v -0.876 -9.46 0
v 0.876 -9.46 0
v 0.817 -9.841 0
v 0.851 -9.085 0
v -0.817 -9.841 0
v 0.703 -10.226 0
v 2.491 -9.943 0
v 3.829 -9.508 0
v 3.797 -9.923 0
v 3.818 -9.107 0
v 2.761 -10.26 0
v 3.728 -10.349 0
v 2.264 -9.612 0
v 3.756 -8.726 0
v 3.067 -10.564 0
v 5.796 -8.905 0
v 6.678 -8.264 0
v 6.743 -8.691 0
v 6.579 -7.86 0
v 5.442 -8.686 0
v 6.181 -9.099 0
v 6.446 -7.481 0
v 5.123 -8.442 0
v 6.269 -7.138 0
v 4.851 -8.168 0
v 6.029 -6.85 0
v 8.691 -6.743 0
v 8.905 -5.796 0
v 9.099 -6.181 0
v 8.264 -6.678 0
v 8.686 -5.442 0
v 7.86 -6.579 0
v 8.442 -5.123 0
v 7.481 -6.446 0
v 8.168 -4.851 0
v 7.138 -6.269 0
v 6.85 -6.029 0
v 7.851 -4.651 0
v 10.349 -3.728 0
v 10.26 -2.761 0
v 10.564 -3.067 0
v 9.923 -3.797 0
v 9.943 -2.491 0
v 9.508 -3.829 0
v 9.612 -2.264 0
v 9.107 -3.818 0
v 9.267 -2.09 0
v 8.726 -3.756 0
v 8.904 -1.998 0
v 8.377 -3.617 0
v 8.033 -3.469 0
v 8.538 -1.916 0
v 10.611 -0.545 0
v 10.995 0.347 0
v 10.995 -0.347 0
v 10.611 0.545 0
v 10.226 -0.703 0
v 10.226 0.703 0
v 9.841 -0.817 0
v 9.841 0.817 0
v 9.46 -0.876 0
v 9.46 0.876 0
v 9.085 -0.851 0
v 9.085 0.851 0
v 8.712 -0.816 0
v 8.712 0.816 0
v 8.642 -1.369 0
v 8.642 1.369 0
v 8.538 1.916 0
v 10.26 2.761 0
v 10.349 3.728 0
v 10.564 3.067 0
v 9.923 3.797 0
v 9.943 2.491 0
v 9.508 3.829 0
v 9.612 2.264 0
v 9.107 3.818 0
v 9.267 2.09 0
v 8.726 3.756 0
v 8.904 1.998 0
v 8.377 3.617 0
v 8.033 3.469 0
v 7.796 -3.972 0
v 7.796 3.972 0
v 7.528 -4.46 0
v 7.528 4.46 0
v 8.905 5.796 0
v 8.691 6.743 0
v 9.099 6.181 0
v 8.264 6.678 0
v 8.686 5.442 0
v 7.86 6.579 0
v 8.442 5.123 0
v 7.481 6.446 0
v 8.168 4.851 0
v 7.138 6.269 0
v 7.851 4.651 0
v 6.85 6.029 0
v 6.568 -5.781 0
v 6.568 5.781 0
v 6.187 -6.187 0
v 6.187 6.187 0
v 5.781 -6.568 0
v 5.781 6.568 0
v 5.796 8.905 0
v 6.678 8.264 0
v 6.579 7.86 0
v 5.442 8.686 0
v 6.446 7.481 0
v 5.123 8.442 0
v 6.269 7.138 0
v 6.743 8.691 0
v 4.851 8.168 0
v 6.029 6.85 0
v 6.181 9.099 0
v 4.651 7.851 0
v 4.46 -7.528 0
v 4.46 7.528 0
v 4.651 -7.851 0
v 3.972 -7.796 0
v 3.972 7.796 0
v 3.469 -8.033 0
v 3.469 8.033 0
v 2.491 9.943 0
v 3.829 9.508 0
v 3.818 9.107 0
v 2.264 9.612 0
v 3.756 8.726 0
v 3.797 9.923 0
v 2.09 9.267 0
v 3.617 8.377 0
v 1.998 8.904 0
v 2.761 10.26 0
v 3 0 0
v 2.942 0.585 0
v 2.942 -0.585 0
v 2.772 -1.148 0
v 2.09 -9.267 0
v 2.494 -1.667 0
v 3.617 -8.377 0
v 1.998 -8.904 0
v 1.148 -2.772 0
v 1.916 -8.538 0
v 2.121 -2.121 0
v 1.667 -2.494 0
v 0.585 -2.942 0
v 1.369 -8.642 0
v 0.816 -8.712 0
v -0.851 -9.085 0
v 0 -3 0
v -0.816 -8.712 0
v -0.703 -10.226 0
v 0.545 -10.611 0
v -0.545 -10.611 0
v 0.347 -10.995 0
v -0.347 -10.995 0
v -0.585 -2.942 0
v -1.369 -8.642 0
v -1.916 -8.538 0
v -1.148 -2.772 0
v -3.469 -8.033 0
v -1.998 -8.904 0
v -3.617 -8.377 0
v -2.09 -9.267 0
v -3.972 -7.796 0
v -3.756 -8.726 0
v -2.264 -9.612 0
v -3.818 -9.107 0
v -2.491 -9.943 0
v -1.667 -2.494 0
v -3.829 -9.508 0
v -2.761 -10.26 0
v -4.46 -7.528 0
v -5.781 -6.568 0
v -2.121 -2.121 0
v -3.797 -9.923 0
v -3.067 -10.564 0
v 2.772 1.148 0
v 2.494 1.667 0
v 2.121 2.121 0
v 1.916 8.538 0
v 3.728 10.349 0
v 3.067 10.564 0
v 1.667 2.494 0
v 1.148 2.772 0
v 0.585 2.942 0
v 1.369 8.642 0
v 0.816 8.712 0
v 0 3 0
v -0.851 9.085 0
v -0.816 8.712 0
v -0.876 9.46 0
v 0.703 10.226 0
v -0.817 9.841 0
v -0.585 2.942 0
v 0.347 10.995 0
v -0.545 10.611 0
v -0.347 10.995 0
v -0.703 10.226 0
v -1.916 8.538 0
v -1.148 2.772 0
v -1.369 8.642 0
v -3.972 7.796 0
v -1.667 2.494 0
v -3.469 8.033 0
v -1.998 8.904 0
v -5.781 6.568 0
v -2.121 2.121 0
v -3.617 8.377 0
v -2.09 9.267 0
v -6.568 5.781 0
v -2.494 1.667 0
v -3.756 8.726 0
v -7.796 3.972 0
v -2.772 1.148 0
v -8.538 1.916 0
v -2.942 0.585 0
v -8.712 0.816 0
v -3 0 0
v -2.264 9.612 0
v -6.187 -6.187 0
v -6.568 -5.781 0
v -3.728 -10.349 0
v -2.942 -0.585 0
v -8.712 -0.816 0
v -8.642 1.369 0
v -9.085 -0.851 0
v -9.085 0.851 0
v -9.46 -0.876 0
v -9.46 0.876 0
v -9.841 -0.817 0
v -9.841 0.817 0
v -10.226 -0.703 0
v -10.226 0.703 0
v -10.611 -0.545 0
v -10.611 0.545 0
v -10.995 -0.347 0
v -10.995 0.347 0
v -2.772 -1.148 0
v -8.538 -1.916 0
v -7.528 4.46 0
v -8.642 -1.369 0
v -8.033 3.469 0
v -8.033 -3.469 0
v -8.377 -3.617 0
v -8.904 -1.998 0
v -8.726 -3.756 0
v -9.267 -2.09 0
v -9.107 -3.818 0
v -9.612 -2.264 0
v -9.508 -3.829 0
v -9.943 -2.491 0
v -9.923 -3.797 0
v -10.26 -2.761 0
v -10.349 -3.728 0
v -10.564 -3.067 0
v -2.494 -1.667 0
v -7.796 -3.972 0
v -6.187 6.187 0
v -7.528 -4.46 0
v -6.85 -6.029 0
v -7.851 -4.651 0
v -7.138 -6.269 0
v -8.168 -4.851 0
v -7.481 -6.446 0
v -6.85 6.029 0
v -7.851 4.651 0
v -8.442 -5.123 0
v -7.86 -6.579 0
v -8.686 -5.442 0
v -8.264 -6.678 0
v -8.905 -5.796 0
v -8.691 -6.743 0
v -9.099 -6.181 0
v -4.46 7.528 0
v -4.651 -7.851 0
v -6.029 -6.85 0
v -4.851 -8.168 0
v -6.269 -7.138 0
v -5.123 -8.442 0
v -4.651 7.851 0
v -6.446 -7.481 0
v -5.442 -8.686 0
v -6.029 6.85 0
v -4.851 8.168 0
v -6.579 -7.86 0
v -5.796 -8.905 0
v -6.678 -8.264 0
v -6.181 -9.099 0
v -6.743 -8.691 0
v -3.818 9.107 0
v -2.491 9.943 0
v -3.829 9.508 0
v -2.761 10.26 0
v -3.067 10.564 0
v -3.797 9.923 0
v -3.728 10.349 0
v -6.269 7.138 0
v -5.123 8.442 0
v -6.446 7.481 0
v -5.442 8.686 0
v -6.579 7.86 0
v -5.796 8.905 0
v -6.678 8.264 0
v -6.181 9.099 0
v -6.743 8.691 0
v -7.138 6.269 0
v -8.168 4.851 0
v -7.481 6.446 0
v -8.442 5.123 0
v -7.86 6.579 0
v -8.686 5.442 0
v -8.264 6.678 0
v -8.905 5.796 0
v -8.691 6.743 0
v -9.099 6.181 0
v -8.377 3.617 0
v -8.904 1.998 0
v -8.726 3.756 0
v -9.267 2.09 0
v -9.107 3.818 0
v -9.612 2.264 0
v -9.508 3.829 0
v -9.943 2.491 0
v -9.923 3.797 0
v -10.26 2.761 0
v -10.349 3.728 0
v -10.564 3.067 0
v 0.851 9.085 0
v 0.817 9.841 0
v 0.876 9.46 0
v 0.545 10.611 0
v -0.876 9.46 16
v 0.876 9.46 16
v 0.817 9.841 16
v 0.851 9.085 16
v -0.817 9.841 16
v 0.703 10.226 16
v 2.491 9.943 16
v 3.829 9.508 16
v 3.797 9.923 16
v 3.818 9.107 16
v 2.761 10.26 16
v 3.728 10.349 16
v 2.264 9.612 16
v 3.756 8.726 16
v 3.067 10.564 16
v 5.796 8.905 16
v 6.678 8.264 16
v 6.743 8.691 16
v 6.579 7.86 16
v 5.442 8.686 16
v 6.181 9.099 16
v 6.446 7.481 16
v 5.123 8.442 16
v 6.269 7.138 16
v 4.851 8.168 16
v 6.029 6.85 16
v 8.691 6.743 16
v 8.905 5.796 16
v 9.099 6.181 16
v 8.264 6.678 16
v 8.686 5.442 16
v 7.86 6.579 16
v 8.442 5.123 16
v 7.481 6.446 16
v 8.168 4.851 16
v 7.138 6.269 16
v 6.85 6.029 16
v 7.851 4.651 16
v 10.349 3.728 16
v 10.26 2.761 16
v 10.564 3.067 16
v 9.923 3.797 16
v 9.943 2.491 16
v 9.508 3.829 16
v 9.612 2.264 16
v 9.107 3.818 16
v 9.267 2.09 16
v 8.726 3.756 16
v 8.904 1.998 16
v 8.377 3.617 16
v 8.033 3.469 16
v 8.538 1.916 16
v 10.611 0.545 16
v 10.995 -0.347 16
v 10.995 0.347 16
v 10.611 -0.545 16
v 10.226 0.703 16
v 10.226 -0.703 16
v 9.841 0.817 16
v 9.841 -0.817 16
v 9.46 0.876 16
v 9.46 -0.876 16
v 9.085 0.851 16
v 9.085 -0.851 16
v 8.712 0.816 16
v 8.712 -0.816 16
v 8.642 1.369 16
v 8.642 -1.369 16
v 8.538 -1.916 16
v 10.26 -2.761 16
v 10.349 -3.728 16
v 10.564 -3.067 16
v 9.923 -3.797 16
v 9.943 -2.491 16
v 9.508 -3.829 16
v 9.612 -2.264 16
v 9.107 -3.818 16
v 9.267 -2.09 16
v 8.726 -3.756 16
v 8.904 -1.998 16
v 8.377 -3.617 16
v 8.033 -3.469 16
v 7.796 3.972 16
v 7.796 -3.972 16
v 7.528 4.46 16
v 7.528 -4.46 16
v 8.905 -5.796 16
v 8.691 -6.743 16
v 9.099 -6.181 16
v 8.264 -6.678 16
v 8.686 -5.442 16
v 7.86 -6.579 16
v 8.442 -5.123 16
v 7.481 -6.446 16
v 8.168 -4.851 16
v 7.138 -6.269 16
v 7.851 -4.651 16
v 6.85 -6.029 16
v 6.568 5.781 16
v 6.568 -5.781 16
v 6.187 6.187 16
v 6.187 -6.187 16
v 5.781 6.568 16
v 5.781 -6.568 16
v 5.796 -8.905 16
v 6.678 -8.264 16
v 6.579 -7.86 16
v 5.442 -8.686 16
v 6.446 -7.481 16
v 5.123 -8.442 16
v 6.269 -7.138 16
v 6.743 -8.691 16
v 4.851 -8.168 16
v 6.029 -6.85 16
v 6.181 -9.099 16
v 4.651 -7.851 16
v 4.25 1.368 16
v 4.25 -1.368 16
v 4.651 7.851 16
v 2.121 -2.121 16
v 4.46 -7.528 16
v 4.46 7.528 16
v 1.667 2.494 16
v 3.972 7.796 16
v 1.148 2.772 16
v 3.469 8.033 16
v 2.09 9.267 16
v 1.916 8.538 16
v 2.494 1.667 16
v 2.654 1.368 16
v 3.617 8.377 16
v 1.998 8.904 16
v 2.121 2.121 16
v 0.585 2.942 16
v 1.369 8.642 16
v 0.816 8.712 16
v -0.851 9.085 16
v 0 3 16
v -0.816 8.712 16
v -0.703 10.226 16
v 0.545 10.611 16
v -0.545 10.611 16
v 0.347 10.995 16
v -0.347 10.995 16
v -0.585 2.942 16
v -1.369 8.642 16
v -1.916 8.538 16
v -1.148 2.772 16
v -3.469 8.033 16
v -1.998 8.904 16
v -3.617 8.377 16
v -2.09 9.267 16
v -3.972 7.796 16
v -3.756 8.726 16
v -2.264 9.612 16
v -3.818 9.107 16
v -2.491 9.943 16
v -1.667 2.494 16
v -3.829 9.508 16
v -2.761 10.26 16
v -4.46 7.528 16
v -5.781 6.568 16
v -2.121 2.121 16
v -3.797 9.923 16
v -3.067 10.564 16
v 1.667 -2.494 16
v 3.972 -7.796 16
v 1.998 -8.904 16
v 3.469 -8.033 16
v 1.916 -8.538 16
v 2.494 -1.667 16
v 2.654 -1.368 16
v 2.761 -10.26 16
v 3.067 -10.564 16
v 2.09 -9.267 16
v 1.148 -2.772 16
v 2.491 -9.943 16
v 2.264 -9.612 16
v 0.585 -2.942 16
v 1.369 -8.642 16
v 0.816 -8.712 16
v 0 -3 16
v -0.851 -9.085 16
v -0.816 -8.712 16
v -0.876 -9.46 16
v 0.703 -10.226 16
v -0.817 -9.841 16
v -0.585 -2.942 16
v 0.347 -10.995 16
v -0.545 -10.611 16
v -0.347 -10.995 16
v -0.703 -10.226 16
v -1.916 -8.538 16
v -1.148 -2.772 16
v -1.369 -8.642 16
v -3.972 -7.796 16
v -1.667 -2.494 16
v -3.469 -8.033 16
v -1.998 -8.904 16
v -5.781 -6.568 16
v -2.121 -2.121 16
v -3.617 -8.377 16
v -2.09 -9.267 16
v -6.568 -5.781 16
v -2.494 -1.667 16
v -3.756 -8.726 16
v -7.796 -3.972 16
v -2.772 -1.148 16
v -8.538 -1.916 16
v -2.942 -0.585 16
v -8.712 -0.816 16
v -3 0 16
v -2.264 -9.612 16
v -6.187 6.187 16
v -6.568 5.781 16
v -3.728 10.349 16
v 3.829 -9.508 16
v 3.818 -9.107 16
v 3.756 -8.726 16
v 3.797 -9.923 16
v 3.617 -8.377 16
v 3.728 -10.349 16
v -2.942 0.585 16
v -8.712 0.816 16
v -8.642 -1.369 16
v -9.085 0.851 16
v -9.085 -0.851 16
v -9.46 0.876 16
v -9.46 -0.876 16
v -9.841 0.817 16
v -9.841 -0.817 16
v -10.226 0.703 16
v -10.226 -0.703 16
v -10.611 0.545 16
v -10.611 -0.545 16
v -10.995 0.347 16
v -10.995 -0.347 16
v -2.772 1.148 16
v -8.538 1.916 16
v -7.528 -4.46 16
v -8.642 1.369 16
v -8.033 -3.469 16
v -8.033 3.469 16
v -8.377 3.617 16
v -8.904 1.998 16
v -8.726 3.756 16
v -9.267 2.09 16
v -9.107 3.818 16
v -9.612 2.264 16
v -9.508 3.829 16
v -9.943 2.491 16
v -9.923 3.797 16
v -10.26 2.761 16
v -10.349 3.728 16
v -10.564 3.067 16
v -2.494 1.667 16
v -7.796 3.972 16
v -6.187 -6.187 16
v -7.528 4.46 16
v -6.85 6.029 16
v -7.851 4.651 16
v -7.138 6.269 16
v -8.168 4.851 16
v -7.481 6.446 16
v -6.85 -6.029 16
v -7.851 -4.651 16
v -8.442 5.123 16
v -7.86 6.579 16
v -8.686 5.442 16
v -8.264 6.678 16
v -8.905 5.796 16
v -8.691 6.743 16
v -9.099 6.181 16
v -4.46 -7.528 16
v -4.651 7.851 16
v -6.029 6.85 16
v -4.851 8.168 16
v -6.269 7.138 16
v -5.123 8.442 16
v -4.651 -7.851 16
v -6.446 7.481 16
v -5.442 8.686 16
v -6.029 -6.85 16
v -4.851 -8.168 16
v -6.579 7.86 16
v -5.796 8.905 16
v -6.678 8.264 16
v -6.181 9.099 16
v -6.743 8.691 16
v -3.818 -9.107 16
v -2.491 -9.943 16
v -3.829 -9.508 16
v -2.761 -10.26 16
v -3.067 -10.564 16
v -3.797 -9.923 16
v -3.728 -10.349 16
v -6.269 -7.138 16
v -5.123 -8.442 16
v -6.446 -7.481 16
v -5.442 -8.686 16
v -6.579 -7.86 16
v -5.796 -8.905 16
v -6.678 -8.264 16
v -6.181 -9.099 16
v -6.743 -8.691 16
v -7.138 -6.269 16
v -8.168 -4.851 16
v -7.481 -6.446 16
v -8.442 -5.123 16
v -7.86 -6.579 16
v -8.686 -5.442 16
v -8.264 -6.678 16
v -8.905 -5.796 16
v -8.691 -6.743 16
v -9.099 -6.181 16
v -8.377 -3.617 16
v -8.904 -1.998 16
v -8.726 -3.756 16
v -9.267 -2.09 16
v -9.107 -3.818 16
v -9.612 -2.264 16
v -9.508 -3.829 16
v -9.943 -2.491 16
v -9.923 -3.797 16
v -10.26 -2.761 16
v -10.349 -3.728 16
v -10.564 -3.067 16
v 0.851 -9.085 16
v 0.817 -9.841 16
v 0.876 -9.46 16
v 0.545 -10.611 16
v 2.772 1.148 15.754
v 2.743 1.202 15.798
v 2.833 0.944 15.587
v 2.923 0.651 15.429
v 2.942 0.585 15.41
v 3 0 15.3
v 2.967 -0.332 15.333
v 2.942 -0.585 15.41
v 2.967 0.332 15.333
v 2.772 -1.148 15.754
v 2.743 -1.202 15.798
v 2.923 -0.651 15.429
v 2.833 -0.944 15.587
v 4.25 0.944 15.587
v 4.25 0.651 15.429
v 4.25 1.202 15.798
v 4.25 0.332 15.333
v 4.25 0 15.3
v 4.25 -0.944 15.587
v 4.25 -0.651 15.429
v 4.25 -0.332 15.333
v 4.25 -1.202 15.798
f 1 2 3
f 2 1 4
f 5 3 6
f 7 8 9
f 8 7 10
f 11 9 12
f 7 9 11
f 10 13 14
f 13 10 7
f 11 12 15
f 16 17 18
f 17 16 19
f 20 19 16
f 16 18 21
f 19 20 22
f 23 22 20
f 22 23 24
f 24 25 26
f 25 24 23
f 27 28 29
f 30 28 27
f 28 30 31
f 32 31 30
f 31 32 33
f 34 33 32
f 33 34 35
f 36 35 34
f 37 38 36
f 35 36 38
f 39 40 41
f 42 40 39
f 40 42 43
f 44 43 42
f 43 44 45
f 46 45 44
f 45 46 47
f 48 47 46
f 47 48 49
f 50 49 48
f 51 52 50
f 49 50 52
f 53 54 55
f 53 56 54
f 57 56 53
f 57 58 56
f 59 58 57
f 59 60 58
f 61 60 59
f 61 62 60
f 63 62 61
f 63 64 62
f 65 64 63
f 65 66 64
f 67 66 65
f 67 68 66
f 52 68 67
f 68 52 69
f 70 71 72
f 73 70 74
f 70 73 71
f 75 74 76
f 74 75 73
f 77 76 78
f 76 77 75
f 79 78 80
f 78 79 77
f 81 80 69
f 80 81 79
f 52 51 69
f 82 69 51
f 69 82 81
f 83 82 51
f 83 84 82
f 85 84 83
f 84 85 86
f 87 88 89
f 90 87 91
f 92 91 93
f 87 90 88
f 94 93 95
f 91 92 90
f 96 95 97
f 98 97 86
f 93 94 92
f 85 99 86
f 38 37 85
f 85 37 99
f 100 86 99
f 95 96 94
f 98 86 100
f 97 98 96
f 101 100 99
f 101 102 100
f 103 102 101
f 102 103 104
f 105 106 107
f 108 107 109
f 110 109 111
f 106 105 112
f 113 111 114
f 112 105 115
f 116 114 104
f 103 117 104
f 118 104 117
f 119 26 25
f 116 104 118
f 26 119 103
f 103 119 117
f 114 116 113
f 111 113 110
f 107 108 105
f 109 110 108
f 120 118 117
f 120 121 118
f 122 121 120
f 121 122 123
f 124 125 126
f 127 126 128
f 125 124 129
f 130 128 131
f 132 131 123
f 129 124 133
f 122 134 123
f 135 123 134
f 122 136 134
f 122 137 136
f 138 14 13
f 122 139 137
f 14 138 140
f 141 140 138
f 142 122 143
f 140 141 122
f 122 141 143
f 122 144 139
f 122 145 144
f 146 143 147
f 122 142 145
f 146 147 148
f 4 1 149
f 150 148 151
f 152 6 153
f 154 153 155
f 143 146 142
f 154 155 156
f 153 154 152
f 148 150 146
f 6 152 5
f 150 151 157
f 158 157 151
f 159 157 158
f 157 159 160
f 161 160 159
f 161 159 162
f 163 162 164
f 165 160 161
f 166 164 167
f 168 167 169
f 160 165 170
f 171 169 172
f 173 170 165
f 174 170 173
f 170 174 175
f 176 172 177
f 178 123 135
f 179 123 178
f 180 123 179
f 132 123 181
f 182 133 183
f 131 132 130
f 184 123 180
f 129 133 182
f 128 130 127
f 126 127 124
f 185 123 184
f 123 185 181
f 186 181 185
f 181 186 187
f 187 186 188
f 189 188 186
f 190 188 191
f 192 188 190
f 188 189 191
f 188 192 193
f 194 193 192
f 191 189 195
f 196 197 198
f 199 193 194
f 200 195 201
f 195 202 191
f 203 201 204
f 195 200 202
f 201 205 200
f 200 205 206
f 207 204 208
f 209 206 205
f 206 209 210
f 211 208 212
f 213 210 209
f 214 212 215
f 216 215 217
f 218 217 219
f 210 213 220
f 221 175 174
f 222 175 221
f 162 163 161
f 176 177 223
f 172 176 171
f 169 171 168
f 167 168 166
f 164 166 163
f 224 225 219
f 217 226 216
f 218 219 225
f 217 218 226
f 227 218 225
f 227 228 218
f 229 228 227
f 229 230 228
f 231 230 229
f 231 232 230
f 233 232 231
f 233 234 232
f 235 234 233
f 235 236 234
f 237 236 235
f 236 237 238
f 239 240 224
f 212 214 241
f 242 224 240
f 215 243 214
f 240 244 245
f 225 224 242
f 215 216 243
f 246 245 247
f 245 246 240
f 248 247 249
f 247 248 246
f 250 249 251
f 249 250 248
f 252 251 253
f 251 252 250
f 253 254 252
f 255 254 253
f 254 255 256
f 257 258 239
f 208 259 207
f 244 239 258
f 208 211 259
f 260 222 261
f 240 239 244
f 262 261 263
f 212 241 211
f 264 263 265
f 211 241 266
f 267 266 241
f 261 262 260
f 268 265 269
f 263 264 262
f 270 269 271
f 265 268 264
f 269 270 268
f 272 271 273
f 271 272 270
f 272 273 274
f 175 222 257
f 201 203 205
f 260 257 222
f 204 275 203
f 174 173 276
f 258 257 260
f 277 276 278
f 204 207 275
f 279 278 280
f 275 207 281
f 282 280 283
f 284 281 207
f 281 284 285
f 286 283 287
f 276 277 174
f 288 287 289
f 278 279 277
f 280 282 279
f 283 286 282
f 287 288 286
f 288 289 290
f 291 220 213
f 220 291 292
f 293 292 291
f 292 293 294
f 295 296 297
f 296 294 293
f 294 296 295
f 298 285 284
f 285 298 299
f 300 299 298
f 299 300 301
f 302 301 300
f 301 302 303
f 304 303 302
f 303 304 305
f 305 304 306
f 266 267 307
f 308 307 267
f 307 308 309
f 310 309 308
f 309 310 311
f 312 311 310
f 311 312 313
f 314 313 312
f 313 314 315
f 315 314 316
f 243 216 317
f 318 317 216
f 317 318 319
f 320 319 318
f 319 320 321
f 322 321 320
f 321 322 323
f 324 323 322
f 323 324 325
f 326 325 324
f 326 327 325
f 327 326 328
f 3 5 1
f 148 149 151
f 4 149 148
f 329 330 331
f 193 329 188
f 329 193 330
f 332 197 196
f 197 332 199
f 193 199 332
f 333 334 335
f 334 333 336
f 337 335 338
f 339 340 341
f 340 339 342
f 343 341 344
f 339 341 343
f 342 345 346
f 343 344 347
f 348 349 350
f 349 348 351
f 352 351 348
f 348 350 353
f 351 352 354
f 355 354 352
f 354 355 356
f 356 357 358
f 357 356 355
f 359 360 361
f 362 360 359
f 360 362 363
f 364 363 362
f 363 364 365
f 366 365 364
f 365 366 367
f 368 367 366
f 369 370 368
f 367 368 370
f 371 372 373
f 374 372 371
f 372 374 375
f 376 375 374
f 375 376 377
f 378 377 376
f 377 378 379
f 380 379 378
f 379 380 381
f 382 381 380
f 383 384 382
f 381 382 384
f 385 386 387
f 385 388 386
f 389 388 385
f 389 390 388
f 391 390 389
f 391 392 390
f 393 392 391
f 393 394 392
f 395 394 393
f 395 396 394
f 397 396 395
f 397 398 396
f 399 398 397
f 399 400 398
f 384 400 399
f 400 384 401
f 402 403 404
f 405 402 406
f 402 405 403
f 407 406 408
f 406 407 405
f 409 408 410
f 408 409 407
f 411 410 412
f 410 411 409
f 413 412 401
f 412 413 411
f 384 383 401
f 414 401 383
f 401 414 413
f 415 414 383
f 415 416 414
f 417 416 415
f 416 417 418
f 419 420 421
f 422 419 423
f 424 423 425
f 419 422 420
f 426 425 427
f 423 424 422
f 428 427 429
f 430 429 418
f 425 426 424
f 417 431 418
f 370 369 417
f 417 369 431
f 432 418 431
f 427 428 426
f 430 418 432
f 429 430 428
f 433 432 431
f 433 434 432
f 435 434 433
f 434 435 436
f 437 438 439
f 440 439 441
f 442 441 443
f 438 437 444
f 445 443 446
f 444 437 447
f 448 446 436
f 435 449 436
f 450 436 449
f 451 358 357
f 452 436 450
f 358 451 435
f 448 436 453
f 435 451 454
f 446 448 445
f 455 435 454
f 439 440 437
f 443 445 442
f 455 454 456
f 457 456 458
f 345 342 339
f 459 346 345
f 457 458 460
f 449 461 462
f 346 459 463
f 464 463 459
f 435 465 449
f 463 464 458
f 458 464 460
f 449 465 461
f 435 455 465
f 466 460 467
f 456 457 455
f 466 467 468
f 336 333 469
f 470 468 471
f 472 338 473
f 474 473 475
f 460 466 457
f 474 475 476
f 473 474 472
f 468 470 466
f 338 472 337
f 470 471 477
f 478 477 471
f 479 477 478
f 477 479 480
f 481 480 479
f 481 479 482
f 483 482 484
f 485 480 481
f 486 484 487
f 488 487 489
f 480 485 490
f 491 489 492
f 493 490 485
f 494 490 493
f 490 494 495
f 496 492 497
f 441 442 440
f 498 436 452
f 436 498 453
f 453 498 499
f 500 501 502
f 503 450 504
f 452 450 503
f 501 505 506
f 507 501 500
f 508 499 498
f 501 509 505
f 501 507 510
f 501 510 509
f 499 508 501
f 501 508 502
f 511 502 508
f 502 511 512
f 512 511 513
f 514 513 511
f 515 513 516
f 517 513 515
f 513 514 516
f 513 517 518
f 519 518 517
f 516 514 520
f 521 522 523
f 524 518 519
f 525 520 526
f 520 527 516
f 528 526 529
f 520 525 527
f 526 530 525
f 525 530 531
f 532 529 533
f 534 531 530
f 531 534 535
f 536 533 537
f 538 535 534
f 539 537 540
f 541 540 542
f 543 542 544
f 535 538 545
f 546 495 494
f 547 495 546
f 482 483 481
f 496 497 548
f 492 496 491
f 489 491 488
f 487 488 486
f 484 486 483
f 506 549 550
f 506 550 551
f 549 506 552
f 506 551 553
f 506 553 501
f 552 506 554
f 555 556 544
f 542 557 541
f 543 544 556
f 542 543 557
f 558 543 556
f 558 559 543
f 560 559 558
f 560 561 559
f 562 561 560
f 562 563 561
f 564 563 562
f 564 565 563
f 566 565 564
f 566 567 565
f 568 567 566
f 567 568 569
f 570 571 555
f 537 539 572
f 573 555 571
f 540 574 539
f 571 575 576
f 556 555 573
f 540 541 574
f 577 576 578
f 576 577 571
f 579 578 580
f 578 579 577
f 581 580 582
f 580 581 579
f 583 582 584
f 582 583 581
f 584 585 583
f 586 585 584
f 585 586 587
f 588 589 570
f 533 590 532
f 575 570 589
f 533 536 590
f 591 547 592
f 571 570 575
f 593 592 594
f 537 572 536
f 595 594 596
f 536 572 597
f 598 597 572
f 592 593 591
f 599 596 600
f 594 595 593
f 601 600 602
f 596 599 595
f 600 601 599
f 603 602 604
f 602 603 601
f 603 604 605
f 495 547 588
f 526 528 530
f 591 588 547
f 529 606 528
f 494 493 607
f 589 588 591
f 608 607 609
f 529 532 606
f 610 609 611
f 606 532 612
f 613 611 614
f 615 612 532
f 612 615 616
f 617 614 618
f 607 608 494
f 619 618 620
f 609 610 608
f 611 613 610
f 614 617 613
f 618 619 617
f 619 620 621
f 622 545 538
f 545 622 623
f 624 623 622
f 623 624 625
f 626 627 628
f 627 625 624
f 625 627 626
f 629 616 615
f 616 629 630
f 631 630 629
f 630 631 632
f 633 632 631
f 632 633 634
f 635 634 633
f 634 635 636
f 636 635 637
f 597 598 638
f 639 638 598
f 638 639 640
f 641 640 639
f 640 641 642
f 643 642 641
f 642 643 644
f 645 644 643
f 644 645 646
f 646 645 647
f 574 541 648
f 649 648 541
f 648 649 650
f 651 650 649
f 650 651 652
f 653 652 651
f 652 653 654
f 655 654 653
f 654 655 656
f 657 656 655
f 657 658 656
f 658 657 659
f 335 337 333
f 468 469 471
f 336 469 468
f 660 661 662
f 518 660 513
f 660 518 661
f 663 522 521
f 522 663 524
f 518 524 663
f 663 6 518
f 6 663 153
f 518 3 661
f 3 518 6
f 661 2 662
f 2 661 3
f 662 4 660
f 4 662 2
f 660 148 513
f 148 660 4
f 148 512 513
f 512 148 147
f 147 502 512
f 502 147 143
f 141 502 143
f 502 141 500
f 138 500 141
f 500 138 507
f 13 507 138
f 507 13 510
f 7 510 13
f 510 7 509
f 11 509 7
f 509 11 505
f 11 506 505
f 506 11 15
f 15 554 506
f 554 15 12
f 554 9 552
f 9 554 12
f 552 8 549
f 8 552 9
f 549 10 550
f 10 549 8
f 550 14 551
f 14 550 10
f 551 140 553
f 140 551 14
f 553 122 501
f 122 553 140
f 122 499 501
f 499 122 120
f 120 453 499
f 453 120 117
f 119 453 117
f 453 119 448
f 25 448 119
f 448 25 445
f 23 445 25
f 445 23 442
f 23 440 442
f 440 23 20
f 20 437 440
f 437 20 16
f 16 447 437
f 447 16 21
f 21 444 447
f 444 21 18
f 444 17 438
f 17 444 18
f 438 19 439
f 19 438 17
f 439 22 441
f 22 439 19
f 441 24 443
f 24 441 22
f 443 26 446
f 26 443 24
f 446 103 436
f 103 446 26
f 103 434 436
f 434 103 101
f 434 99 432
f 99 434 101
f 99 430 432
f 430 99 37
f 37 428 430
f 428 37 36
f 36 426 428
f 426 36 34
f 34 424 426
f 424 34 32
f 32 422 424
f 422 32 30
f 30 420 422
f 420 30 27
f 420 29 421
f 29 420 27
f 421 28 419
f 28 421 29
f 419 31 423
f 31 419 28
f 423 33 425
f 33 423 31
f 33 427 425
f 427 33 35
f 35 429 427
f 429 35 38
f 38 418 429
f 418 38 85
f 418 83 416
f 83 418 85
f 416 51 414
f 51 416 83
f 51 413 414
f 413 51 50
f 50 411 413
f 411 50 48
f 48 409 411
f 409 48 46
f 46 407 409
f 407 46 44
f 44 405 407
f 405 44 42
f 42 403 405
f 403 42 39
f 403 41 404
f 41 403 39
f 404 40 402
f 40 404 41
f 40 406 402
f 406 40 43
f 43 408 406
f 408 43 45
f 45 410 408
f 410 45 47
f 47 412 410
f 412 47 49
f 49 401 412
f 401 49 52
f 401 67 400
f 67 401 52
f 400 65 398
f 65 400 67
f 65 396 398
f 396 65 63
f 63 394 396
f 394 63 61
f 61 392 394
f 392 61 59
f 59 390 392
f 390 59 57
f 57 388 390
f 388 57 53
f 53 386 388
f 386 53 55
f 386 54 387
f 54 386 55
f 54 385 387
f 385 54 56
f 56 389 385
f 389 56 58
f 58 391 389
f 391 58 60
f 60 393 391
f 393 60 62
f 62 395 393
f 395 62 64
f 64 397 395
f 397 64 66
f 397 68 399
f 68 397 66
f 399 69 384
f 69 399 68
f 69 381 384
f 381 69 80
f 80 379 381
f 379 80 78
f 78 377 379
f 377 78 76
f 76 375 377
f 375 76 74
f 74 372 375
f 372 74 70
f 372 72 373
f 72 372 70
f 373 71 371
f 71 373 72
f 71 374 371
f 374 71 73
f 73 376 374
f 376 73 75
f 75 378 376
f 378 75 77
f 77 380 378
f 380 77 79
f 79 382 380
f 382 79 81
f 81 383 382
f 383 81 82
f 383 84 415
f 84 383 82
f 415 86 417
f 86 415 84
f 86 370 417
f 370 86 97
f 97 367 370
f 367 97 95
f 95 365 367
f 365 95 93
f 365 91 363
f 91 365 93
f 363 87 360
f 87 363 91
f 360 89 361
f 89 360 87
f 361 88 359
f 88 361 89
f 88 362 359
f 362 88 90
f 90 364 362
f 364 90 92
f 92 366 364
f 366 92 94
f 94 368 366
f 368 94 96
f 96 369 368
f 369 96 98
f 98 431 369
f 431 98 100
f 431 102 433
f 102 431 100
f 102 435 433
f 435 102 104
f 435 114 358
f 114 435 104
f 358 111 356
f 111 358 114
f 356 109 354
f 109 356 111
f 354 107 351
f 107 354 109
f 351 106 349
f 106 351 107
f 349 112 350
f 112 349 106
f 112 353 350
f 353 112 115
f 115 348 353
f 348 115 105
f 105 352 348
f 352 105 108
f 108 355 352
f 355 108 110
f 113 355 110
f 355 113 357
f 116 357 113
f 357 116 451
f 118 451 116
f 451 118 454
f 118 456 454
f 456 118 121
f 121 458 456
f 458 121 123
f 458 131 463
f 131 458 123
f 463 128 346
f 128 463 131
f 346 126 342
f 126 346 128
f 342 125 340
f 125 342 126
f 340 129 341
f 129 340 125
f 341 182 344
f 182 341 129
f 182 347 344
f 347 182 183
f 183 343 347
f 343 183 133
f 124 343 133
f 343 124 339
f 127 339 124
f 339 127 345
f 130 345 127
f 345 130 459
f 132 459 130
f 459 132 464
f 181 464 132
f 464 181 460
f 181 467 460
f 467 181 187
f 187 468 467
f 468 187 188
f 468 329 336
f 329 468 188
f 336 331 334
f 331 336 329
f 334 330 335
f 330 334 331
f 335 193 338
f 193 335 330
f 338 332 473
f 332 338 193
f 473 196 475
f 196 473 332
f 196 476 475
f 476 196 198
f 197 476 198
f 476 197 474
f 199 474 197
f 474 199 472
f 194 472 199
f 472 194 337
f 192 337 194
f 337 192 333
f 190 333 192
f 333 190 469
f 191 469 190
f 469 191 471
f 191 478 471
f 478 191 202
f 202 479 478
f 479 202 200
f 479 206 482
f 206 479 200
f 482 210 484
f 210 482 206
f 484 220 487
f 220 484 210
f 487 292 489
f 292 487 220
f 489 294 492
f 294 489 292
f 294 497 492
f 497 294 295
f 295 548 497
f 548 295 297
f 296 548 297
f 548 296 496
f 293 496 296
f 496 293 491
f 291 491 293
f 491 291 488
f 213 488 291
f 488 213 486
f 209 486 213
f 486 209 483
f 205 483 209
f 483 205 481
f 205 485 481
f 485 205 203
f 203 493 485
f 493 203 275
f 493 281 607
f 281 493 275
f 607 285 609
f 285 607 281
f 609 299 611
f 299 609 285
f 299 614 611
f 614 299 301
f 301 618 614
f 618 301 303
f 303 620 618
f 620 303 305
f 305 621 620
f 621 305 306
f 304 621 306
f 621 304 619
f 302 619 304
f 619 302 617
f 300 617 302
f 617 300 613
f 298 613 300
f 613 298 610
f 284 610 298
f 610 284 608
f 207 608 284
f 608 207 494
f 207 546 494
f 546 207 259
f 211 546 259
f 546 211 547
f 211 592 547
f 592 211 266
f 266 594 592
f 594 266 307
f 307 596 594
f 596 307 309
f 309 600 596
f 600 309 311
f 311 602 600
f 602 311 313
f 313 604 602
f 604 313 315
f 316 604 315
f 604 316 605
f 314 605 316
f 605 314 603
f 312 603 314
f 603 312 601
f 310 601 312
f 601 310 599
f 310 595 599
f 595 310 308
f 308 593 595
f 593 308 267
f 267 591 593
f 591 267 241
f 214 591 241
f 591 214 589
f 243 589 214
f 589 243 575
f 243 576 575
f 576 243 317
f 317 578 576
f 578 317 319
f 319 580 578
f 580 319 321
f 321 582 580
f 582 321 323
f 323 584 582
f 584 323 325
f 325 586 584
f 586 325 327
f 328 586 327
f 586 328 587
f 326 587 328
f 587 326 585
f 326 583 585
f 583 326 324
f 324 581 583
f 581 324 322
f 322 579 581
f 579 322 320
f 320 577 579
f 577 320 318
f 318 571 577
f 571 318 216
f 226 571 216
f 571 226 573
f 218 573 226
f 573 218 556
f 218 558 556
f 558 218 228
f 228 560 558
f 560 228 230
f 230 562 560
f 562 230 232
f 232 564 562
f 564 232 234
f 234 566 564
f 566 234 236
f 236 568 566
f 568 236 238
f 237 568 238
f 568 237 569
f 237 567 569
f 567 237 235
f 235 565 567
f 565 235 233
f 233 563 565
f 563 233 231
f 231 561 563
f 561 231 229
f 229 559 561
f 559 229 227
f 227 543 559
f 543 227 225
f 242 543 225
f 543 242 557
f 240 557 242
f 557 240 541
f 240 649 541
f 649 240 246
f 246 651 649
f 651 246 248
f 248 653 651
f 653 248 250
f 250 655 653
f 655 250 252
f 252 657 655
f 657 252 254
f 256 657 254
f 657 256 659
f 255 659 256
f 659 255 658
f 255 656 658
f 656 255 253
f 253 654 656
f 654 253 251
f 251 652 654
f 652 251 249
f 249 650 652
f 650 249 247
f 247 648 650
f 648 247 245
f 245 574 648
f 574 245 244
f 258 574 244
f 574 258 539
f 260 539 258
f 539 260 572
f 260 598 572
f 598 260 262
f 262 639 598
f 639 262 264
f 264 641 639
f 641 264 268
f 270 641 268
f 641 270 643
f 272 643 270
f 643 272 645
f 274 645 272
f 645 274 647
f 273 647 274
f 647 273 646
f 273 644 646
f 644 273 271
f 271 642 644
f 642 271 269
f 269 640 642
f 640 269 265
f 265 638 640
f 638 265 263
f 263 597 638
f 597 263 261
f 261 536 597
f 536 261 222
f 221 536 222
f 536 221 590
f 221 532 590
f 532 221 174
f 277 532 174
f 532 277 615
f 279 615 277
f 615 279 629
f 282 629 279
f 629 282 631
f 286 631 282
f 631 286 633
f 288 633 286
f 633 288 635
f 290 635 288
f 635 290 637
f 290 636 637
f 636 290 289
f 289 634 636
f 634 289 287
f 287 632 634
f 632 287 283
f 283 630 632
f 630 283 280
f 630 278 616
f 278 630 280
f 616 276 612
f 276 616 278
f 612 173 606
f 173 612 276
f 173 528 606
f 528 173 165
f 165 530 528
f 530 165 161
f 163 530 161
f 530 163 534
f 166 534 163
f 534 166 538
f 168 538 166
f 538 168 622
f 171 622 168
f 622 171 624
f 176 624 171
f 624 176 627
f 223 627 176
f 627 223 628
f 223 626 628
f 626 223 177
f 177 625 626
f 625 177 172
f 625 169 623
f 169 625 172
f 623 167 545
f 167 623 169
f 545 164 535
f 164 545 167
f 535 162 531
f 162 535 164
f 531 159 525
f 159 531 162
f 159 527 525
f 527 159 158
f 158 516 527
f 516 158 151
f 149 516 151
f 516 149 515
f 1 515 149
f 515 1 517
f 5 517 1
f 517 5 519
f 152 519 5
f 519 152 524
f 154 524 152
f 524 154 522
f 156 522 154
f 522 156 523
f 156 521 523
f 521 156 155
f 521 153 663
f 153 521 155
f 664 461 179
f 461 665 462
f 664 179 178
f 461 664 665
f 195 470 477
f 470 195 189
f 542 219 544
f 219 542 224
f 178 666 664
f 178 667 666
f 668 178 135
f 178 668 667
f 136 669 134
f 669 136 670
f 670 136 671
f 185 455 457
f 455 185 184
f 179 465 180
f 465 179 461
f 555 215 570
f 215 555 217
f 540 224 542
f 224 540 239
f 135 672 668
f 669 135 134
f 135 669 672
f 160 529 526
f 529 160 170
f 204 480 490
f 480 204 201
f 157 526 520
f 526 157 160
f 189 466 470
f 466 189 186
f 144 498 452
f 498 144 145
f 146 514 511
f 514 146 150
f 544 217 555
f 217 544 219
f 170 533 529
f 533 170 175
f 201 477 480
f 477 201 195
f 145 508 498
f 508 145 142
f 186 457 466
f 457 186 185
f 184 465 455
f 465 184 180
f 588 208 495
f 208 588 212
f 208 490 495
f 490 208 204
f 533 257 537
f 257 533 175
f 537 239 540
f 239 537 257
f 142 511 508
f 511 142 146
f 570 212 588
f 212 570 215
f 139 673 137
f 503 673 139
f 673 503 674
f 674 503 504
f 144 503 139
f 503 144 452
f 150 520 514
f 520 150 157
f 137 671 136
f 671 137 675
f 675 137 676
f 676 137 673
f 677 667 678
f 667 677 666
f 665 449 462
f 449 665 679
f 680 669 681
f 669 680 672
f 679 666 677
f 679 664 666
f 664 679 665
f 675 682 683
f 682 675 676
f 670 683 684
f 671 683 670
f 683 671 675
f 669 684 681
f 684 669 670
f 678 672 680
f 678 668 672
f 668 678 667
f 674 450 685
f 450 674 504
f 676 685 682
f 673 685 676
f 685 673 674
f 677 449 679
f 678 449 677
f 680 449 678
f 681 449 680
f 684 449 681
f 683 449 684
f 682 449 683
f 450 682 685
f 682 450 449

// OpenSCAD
$fn = 32;

// ----------------------------------------------------------------------
// Spur gear: m=1 z=20, 22 mm tip diameter x 16 mm
// ----------------------------------------------------------------------

// --- parameters (mm) ---
module_m = 1;             // module
teeth = 20;               // number of teeth
face_w = 16;              // face width
pa = 20;                  // pressure angle, deg
bore_d = 6;               // shaft bore
set_d = 3.4;              // set screw tap hole
set_z = 17;               // set screw height

/* --- involute profile --- */
pitch_r = module_m * teeth / 2;
base_r = pitch_r * cos(pa);
tip_r = pitch_r + module_m;
root_r = pitch_r - 1.25 * module_m;
flank_steps = 6;

function inv_deg(a) = (tan(a) - a * PI / 180) * 180 / PI;
function flank_r(i) = root_r + (tip_r - root_r) * i / flank_steps;
function half_angle(r) = 90 / teeth + inv_deg(pa) - inv_deg(acos(min(1, base_r / r)));
function tooth_pt(k, i, side) =
    let (r = flank_r(i), a = k * 360 / teeth + side * half_angle(r))
    [r * cos(a), r * sin(a)];

module tooth_profile() {
  polygon(points = [
    for (k = [0 : teeth - 1])
      each [
        for (i = [0 : flank_steps]) tooth_pt(k, i, -1),
        for (i = [flank_steps : -1 : 0]) tooth_pt(k, i, 1),
        let (ta = (k + 0.5) * 360 / teeth)
          [root_r * cos(ta), root_r * sin(ta)]
      ]
  ]);
}

module gear_disc() {
  linear_extrude(height = face_w) tooth_profile();
}

difference() {
  gear_disc();
  translate([0, 0, -1]) cylinder(h = face_w + 3, d = bore_d);
  /* set screw, drilled radially */
  translate([-1, 0, set_z]) rotate([0, 90, 0]) cylinder(h = (root_r * 0.6), d = set_d);
}
